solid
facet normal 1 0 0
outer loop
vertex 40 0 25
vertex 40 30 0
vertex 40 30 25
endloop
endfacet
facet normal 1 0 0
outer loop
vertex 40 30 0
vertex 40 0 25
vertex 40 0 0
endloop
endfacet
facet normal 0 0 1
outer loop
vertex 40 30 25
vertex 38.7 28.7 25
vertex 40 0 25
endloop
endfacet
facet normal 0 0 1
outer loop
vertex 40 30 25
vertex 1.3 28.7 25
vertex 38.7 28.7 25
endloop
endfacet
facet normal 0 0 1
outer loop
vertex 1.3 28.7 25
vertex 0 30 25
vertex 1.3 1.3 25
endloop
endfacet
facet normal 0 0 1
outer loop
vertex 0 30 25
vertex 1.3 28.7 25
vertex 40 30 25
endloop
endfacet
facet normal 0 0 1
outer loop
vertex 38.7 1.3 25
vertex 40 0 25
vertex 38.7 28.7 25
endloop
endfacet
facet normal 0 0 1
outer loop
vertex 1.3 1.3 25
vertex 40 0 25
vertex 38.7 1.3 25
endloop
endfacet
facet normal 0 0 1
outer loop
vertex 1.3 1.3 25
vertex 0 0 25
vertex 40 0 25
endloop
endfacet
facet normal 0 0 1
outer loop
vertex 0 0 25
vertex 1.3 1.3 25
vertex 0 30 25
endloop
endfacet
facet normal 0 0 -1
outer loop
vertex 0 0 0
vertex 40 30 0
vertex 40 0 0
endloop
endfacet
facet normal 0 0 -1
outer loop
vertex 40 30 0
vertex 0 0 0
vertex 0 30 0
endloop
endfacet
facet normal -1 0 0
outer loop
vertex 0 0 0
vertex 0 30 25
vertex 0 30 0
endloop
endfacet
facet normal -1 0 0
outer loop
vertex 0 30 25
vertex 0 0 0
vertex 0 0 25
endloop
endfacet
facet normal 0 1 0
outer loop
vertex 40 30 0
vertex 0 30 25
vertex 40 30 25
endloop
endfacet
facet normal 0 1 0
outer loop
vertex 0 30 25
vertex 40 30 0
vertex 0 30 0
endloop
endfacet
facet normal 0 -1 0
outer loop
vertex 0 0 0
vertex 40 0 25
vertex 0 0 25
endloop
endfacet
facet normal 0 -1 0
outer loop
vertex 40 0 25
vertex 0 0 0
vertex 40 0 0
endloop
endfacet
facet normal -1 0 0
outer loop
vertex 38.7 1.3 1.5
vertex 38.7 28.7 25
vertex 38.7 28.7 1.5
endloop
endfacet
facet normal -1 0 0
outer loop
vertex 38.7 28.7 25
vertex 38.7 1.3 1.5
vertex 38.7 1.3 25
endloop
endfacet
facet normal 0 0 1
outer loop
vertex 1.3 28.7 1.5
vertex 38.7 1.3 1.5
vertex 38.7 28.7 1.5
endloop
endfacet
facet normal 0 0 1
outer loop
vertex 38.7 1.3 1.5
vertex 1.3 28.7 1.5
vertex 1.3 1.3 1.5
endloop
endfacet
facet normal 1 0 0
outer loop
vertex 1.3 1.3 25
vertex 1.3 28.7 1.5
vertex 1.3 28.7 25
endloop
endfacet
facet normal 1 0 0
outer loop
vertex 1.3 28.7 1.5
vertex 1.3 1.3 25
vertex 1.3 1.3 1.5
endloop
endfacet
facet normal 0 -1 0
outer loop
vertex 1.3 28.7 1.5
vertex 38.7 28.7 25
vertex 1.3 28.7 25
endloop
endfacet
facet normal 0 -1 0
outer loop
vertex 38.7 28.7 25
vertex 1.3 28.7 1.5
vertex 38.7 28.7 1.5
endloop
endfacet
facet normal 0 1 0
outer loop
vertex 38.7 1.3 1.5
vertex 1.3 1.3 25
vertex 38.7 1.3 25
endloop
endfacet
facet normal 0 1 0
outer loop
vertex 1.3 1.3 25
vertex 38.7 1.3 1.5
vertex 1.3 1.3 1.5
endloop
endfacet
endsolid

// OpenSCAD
$fn = 32;

// ----------------------------------------------------------------------
// Open box: 1.3 mm walls
// ----------------------------------------------------------------------

// --- parameters (mm) ---
box_l = 40;               // outer length, X
box_w = 30;               // outer width, Y
box_h = 25;               // outer height, Z
wall = 1.3;               // wall thickness
floor = 1.5;              // floor thickness

difference() {
  cube([box_l, box_w, box_h]);
  translate([wall, wall, floor])
    cube([box_l - 2 * wall, box_w - 2 * wall, box_h]);
}
